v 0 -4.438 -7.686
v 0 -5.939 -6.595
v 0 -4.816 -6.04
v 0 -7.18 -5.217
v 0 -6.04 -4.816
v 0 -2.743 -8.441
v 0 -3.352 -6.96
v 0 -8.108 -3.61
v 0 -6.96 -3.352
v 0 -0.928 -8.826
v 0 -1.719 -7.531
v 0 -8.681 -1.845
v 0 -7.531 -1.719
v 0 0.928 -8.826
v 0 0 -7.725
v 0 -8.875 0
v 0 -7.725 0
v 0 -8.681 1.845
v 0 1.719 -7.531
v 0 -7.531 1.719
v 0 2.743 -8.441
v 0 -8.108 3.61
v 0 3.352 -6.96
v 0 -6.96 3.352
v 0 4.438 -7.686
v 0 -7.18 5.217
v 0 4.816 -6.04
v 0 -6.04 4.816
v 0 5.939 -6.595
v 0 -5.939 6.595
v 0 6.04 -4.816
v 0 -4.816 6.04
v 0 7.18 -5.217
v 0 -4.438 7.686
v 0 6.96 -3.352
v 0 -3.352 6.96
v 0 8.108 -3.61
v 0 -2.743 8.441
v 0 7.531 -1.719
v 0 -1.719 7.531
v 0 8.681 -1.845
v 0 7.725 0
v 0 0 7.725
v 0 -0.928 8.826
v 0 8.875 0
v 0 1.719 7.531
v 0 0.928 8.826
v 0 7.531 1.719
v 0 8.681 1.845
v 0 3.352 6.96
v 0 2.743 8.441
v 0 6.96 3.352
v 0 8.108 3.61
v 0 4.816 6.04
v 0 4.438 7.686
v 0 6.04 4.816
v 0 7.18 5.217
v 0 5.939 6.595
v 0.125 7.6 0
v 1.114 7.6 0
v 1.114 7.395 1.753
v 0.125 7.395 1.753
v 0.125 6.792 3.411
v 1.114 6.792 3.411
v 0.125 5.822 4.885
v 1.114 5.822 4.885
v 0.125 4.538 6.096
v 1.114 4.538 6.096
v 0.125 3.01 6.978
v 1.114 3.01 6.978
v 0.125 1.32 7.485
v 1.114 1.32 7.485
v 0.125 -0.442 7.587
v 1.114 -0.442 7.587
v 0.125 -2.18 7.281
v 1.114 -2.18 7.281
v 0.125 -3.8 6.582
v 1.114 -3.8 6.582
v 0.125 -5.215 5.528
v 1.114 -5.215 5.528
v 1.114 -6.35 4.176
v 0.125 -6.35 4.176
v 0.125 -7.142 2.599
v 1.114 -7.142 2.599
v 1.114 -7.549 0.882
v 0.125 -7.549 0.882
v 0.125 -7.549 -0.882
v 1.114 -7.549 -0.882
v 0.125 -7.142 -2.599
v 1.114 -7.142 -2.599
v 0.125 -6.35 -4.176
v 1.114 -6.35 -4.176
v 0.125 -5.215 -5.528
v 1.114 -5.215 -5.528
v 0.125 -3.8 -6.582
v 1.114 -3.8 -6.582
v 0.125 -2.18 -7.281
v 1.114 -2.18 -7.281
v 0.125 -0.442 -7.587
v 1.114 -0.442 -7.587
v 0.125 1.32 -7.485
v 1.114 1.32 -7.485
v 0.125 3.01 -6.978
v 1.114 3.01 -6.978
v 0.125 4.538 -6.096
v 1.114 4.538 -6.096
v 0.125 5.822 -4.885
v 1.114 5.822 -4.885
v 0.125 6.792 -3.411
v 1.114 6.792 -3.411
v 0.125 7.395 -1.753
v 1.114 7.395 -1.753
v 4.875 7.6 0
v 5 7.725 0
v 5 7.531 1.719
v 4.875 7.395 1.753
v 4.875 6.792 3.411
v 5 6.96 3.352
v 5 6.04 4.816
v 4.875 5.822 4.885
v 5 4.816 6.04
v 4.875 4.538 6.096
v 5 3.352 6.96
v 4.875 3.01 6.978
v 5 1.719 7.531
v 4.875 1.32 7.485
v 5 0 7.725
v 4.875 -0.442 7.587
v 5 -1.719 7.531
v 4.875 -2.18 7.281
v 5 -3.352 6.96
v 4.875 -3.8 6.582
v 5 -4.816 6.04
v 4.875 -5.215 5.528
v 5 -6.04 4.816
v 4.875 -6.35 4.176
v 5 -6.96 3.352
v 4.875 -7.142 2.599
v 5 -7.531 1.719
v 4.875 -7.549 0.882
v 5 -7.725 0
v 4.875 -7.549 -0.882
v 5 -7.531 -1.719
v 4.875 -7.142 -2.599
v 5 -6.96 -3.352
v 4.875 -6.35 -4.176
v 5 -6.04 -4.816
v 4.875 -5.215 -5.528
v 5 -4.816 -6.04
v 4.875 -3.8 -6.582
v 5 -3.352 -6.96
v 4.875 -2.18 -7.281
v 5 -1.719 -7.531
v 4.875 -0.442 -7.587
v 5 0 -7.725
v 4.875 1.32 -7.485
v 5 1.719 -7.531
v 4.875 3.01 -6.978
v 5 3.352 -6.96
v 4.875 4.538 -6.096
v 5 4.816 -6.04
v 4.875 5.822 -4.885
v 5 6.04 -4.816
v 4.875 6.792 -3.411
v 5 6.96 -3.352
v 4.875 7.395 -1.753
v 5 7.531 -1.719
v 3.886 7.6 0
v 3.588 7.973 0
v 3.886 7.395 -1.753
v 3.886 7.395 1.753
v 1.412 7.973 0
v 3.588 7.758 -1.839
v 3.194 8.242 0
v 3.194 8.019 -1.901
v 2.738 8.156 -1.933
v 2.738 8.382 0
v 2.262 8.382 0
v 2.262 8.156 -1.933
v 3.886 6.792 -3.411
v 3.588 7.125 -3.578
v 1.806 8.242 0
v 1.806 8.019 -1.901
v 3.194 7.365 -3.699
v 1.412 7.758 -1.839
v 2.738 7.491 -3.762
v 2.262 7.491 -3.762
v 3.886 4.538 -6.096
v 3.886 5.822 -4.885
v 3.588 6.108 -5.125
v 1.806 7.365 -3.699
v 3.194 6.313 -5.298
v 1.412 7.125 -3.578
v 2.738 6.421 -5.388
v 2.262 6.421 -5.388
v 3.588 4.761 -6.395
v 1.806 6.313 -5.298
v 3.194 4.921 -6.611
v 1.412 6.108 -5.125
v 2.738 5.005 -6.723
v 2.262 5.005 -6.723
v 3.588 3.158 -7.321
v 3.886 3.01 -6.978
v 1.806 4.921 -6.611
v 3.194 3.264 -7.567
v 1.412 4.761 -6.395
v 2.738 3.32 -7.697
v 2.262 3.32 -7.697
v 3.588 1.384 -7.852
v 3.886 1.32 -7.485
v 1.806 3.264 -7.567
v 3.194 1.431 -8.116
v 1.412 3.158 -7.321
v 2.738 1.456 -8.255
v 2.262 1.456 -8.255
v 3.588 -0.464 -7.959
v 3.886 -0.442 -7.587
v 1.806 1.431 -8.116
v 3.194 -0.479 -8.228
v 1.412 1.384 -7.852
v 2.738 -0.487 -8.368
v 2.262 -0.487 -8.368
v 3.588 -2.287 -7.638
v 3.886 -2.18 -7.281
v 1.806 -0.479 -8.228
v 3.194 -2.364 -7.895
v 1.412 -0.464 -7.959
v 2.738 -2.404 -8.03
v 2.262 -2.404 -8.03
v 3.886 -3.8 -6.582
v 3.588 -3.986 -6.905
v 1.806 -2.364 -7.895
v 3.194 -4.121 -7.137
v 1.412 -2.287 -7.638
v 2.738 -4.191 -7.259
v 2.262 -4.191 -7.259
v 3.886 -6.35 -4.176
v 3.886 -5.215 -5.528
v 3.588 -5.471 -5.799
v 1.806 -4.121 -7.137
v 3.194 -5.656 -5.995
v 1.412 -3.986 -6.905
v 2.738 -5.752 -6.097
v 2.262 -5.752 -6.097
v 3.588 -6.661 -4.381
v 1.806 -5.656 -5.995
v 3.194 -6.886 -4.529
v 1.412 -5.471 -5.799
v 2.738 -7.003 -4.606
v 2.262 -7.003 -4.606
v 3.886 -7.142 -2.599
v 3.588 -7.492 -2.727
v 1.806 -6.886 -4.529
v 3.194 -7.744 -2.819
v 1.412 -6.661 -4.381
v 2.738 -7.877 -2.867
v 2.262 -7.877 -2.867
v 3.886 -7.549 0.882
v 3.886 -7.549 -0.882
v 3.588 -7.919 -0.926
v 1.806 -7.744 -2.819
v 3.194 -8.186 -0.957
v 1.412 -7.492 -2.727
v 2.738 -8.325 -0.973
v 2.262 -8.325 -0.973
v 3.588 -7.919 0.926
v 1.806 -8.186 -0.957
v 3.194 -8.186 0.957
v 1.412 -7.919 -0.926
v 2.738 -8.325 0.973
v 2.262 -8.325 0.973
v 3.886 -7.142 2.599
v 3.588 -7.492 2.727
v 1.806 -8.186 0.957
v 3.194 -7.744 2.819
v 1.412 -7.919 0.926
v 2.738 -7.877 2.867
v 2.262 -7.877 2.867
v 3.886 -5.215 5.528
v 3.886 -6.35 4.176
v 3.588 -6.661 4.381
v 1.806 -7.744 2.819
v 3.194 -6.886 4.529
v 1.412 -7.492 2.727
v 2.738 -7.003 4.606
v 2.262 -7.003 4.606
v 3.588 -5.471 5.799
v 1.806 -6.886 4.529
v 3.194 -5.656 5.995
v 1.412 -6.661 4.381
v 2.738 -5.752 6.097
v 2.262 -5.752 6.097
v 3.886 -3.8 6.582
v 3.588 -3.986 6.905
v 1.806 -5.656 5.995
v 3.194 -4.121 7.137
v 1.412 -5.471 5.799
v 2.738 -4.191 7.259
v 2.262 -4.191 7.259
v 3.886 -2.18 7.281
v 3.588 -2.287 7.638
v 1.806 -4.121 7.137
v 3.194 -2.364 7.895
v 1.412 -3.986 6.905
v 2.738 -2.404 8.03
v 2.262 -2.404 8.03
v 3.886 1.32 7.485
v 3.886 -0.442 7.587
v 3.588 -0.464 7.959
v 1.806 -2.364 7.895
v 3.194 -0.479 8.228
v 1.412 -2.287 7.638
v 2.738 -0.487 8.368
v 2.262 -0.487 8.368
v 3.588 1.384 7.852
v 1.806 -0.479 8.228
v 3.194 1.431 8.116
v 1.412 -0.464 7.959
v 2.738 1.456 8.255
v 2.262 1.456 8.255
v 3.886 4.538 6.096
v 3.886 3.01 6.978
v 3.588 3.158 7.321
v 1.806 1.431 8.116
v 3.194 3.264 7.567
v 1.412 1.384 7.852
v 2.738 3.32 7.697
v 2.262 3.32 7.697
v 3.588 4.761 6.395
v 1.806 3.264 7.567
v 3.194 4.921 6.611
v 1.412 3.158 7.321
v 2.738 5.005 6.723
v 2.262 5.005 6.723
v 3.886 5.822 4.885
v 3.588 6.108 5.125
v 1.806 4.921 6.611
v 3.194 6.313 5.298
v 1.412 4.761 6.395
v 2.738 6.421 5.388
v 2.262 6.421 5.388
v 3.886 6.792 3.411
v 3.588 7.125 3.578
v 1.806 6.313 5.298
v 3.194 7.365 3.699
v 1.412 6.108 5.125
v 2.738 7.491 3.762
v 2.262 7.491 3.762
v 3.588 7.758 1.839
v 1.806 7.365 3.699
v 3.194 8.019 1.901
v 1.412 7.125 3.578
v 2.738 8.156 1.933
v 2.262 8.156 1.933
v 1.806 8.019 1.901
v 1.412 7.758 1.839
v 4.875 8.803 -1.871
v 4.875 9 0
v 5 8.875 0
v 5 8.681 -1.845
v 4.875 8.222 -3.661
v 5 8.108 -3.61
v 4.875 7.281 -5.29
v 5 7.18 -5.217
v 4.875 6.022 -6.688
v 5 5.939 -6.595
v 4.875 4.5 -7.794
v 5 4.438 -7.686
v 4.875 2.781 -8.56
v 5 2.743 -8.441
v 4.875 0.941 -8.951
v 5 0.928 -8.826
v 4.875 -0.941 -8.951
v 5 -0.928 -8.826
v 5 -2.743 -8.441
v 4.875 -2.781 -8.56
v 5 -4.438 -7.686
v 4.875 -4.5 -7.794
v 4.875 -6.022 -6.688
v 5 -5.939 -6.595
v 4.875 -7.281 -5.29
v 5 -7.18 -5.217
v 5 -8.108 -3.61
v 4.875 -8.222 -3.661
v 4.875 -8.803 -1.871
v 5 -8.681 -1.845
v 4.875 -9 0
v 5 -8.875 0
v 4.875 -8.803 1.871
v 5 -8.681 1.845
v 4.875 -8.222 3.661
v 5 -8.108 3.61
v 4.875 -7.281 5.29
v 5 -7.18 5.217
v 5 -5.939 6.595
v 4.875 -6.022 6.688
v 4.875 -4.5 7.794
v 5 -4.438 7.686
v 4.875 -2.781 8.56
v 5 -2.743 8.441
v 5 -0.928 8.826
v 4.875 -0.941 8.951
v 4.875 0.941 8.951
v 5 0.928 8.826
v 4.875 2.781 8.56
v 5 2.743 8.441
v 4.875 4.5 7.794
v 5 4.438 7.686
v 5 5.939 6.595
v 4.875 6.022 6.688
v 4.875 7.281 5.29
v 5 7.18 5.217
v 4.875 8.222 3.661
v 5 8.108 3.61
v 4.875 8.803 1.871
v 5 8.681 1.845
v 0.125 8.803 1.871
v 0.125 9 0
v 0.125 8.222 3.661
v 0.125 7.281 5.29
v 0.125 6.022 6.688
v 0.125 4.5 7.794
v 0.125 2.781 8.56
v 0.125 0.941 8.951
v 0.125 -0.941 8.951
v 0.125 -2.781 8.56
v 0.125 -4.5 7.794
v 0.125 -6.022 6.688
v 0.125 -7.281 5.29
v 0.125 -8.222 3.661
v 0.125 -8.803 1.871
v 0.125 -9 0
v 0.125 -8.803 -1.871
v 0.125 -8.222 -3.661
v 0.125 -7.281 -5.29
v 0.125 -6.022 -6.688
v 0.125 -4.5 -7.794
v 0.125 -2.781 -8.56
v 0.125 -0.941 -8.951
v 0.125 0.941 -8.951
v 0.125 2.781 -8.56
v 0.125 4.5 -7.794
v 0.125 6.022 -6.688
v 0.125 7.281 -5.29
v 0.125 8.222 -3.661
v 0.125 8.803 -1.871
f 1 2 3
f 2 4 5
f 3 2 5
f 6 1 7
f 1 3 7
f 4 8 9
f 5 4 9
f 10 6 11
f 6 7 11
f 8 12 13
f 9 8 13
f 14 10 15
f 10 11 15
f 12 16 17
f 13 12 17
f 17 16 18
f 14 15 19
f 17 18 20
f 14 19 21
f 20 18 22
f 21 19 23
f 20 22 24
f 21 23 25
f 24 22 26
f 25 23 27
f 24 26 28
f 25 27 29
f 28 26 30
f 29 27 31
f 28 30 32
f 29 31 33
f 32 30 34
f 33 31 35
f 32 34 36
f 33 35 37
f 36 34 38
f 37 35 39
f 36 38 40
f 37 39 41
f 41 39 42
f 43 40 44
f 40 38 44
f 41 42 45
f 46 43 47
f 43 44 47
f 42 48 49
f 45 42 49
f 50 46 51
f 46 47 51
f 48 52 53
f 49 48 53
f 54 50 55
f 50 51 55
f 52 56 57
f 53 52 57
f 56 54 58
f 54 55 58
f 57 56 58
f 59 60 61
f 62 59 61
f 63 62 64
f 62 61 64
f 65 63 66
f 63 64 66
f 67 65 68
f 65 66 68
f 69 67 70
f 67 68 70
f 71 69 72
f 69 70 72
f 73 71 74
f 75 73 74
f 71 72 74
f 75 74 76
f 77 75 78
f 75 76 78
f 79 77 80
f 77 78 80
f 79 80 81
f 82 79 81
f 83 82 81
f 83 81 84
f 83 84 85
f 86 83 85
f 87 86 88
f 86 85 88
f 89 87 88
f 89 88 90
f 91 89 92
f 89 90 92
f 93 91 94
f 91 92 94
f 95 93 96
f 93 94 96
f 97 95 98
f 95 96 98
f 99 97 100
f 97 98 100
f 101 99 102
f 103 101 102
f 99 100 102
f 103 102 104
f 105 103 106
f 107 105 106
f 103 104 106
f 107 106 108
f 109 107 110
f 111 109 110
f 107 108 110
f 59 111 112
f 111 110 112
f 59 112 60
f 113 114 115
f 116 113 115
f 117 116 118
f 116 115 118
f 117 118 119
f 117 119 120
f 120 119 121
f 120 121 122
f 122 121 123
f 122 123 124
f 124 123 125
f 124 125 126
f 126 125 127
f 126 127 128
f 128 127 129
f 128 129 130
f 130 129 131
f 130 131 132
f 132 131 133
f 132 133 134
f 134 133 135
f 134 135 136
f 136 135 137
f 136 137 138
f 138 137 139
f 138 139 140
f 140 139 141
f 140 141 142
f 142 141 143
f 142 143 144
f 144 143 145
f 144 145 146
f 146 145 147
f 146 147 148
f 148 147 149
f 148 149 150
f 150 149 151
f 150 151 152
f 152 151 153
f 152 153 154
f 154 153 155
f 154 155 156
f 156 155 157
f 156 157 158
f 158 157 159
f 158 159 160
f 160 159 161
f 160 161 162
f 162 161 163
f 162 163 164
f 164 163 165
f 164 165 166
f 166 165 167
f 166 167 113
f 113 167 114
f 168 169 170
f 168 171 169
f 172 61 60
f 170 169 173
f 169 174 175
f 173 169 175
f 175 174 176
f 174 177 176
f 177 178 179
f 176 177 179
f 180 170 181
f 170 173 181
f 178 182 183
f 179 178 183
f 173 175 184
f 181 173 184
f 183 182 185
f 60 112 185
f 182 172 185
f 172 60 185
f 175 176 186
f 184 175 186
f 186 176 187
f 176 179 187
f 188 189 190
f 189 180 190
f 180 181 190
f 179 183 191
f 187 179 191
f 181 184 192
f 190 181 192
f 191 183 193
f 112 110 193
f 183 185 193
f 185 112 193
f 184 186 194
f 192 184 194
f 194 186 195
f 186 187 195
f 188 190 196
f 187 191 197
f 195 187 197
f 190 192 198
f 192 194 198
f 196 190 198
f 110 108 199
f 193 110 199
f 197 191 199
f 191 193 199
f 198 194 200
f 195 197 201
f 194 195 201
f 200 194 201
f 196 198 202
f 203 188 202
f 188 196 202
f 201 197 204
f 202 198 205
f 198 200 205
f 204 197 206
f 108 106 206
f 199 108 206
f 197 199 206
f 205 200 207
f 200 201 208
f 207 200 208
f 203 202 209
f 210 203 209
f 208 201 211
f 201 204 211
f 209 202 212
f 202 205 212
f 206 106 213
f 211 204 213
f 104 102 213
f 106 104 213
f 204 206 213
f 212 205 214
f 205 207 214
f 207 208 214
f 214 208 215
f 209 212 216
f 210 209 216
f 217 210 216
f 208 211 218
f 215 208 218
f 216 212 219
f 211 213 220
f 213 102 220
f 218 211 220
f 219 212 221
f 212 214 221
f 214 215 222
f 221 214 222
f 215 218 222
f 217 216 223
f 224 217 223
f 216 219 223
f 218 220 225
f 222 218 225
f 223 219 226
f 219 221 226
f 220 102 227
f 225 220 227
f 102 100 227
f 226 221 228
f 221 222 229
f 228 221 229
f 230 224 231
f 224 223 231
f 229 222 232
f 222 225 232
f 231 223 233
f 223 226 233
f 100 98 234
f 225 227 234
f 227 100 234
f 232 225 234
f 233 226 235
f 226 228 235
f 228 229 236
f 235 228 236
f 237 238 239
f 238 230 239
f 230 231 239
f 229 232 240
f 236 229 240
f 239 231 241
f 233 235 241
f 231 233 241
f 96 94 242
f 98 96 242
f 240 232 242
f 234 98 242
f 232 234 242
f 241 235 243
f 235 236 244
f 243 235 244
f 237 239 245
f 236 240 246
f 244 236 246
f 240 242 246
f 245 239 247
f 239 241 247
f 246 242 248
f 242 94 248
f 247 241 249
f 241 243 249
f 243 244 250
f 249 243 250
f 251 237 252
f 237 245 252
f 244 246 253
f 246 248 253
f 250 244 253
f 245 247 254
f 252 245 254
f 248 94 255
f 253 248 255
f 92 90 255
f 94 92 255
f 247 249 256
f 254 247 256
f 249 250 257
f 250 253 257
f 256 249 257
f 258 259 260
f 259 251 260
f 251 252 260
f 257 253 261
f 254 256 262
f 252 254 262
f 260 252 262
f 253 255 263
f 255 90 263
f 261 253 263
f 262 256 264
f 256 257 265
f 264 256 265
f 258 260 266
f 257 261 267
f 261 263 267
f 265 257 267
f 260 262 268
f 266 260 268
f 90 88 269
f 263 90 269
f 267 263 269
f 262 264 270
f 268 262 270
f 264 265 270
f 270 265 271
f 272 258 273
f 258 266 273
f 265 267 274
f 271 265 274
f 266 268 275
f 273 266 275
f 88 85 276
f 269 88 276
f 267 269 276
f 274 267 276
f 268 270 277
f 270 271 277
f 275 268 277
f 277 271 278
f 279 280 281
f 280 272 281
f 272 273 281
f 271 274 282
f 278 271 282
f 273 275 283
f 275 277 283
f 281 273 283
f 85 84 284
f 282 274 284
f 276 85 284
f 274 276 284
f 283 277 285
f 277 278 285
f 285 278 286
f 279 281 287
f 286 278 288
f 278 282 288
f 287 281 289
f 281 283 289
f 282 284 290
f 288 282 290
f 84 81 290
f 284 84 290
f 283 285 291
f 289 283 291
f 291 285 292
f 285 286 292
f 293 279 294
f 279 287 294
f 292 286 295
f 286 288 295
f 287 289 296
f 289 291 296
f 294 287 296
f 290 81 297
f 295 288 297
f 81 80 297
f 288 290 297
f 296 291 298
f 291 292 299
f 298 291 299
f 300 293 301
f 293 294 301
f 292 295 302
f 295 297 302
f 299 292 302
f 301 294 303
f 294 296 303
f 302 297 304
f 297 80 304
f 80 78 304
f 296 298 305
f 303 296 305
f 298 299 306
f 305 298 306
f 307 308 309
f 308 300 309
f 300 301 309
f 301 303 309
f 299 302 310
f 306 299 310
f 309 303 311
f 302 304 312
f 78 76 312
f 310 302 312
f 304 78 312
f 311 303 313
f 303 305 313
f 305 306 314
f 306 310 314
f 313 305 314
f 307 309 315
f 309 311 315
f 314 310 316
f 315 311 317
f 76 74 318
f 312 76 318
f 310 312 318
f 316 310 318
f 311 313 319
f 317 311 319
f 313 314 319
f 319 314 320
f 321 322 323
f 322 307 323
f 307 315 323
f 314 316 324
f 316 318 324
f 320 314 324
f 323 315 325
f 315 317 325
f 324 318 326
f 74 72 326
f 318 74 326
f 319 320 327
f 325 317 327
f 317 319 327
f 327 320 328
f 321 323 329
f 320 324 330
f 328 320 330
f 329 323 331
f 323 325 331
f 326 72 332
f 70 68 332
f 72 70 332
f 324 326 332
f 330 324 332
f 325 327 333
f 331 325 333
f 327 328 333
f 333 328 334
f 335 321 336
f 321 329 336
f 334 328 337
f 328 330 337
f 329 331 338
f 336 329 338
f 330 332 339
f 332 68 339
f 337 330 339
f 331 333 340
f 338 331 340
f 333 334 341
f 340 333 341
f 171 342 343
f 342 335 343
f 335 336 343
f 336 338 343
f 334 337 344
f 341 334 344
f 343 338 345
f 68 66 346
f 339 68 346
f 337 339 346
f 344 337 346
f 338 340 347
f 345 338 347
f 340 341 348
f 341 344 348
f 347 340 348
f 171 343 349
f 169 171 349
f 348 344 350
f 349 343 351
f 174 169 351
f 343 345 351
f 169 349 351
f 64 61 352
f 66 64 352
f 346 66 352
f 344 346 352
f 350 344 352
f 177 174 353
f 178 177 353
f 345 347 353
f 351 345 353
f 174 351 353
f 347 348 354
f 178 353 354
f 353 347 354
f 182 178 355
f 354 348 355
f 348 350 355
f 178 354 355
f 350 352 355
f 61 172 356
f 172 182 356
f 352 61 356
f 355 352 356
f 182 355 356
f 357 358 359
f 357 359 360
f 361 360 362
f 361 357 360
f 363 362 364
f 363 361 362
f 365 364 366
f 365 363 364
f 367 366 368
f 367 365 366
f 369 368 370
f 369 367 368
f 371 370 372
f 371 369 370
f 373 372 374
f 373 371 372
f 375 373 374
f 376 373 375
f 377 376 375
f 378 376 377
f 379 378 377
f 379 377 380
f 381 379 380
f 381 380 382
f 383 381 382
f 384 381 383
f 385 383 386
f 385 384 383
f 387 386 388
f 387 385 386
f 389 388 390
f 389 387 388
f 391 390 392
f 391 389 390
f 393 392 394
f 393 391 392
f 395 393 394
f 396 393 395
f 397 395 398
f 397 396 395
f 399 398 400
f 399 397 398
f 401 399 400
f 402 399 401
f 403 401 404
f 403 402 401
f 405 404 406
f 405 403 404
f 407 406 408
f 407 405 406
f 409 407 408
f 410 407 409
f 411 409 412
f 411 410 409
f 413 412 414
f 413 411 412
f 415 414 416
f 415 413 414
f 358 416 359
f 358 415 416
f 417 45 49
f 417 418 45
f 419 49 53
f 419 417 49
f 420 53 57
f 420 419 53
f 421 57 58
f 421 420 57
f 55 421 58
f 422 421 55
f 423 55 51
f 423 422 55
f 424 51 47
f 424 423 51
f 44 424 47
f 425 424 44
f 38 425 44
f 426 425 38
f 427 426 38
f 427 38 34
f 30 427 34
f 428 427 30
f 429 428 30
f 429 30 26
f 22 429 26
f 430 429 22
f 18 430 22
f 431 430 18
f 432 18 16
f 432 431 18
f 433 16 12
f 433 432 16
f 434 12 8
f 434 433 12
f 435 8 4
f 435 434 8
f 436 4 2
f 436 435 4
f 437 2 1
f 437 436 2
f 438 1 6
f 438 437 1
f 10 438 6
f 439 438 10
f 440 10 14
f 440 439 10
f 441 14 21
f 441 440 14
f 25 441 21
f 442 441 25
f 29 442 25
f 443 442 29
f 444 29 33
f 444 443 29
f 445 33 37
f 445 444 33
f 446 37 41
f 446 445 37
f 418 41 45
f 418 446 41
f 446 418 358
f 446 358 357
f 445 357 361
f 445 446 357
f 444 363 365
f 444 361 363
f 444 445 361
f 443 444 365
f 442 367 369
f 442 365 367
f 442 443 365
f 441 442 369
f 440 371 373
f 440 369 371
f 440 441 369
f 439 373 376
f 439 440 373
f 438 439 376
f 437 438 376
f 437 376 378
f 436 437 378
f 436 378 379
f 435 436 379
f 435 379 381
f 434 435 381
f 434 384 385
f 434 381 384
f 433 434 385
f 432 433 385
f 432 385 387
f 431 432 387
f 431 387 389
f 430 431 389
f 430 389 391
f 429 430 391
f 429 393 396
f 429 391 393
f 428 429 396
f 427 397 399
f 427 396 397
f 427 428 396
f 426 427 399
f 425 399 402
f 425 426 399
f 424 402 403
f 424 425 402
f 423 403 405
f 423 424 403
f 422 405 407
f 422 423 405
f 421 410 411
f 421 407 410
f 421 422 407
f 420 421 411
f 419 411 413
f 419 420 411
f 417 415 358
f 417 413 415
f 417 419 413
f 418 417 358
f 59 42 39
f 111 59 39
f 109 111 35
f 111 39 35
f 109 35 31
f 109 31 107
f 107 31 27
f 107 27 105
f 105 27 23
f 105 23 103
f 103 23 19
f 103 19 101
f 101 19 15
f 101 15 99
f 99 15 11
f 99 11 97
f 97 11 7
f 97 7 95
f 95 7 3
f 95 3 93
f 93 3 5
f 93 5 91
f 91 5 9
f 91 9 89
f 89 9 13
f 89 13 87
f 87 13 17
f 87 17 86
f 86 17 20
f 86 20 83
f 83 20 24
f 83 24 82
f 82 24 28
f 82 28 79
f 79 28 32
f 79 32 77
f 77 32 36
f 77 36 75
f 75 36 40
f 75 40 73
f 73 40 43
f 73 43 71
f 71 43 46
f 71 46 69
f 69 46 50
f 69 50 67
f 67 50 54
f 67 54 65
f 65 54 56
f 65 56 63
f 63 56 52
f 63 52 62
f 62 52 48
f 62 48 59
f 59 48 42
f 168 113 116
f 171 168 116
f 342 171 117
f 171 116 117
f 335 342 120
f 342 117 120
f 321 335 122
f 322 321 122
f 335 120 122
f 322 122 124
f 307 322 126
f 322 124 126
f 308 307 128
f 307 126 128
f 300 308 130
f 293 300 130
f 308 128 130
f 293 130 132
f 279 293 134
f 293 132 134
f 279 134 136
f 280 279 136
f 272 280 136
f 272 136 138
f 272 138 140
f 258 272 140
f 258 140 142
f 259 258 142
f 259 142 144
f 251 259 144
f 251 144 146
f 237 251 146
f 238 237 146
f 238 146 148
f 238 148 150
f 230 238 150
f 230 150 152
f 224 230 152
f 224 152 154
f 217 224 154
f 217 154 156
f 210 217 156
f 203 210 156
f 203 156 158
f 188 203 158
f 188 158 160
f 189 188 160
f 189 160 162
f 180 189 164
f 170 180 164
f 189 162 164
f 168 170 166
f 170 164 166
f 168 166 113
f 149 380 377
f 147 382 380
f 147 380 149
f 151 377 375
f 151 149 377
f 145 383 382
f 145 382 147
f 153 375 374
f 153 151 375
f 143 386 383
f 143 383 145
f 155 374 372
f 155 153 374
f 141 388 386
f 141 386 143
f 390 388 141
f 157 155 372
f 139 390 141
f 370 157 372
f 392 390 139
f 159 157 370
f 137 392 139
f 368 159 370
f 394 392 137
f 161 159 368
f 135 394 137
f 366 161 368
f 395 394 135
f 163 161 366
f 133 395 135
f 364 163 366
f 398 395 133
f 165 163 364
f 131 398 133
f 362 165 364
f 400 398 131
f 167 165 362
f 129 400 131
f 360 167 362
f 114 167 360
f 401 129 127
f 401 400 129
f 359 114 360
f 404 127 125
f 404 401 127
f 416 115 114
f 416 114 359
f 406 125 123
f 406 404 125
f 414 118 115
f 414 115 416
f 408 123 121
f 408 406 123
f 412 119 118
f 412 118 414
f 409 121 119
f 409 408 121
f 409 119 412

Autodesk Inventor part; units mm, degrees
sketch "Sketch_3" plane through (0, 0, 0) normal (0, 0, 1) x (1, 0, 0)
  line L0 (5, 0) -> (0, 0)
  line L1 (0, 8.875) -> (0, 7.725)
  line L2 (0, 7.725) -> (0.125, 7.6)
  line L3 (0.125, 7.6) -> (1.1144, 7.6)
  arc A0 (3.8856, 7.6) -> (1.1144, 7.6) centre (2.5, 6.8) ccw
  line L4 (3.8856, 7.6) -> (4.875, 7.6)
  line L5 (4.875, 7.6) -> (5, 7.725)
  line L6 (5, 7.725) -> (5, 8.875)
  line L7 (5, 8.875) -> (4.875, 9)
  line L8 (4.875, 9) -> (0.125, 9)
  line L9 (0.125, 9) -> (0, 8.875)
revolve "Revolution1" add sketch "Sketch_3" angle 360 about axis through (5, 0, 0) along (1, 0, 0)
ref_plane "OR_Cage_XY" through (0, 0, 0) normal (1, 0, 0) x (0, 0, -1)
ref_plane "OR_Cage_YZ" through (0, 0, 0) normal (0, 0, -1) x (0, 1, 0)
ref_plane "OR_Cage_ZX" through (0, 0, 0) normal (0, 1, 0) x (1, 0, 0)
ref_plane "OR_IR_XY" through (0, 0, 0) normal (1, 0, 0) x (0, 0, -1)
ref_plane "OR_IR_YZ" through (0, 0, 0) normal (0, 0, -1) x (0, 1, 0)
ref_plane "OR_IR_ZX" through (0, 0, 0) normal (0, 1, 0) x (1, 0, 0)
ref_plane "OR_ball_1_XY" through (2.5, 6.8, 0) normal (1, 0, 0) x (0, 0, -1)
ref_plane "OR_ball_1_YZ" through (2.5, 6.8, 0) normal (0, 0, -1) x (0, 1, 0)
ref_plane "OR_ball_1_ZX" through (2.5, 6.8, 0) normal (0, 1, 0) x (1, 0, 0)
ref_plane "OR_ball_2_XY" through (2.5, 3.4, 5.889) normal (1, 0, 0) x (0, 0, -1)
ref_plane "OR_ball_2_YZ" through (2.5, 3.4, 5.889) normal (0, 0, -1) x (0, 1, 0)
ref_plane "OR_ball_2_ZX" through (2.5, 3.4, 5.889) normal (0, 1, 0) x (1, 0, 0)
ref_plane "OR_ball_3_XY" through (2.5, -3.4, 5.889) normal (1, 0, 0) x (0, 0, -1)
ref_plane "OR_ball_3_YZ" through (2.5, -3.4, 5.889) normal (0, 0, -1) x (0, 1, 0)
ref_plane "OR_ball_3_ZX" through (2.5, -3.4, 5.889) normal (0, 1, 0) x (1, 0, 0)
ref_plane "OR_ball_4_XY" through (2.5, -6.8, 0) normal (1, 0, 0) x (0, 0, -1)
ref_plane "OR_ball_4_YZ" through (2.5, -6.8, 0) normal (0, 0, -1) x (0, 1, 0)
ref_plane "OR_ball_4_ZX" through (2.5, -6.8, 0) normal (0, 1, 0) x (1, 0, 0)
ref_plane "OR_ball_5_XY" through (2.5, -3.4, -5.889) normal (1, 0, 0) x (0, 0, -1)
ref_plane "OR_ball_5_YZ" through (2.5, -3.4, -5.889) normal (0, 0, -1) x (0, 1, 0)
ref_plane "OR_ball_5_ZX" through (2.5, -3.4, -5.889) normal (0, 1, 0) x (1, 0, 0)
ref_plane "OR_ball_6_XY" through (2.5, 3.4, -5.889) normal (1, 0, 0) x (0, 0, -1)
ref_plane "OR_ball_6_YZ" through (2.5, 3.4, -5.889) normal (0, 0, -1) x (0, 1, 0)
ref_plane "OR_ball_6_ZX" through (2.5, 3.4, -5.889) normal (0, 1, 0) x (1, 0, 0)
properties part number "040102DR-18-H8_or"
